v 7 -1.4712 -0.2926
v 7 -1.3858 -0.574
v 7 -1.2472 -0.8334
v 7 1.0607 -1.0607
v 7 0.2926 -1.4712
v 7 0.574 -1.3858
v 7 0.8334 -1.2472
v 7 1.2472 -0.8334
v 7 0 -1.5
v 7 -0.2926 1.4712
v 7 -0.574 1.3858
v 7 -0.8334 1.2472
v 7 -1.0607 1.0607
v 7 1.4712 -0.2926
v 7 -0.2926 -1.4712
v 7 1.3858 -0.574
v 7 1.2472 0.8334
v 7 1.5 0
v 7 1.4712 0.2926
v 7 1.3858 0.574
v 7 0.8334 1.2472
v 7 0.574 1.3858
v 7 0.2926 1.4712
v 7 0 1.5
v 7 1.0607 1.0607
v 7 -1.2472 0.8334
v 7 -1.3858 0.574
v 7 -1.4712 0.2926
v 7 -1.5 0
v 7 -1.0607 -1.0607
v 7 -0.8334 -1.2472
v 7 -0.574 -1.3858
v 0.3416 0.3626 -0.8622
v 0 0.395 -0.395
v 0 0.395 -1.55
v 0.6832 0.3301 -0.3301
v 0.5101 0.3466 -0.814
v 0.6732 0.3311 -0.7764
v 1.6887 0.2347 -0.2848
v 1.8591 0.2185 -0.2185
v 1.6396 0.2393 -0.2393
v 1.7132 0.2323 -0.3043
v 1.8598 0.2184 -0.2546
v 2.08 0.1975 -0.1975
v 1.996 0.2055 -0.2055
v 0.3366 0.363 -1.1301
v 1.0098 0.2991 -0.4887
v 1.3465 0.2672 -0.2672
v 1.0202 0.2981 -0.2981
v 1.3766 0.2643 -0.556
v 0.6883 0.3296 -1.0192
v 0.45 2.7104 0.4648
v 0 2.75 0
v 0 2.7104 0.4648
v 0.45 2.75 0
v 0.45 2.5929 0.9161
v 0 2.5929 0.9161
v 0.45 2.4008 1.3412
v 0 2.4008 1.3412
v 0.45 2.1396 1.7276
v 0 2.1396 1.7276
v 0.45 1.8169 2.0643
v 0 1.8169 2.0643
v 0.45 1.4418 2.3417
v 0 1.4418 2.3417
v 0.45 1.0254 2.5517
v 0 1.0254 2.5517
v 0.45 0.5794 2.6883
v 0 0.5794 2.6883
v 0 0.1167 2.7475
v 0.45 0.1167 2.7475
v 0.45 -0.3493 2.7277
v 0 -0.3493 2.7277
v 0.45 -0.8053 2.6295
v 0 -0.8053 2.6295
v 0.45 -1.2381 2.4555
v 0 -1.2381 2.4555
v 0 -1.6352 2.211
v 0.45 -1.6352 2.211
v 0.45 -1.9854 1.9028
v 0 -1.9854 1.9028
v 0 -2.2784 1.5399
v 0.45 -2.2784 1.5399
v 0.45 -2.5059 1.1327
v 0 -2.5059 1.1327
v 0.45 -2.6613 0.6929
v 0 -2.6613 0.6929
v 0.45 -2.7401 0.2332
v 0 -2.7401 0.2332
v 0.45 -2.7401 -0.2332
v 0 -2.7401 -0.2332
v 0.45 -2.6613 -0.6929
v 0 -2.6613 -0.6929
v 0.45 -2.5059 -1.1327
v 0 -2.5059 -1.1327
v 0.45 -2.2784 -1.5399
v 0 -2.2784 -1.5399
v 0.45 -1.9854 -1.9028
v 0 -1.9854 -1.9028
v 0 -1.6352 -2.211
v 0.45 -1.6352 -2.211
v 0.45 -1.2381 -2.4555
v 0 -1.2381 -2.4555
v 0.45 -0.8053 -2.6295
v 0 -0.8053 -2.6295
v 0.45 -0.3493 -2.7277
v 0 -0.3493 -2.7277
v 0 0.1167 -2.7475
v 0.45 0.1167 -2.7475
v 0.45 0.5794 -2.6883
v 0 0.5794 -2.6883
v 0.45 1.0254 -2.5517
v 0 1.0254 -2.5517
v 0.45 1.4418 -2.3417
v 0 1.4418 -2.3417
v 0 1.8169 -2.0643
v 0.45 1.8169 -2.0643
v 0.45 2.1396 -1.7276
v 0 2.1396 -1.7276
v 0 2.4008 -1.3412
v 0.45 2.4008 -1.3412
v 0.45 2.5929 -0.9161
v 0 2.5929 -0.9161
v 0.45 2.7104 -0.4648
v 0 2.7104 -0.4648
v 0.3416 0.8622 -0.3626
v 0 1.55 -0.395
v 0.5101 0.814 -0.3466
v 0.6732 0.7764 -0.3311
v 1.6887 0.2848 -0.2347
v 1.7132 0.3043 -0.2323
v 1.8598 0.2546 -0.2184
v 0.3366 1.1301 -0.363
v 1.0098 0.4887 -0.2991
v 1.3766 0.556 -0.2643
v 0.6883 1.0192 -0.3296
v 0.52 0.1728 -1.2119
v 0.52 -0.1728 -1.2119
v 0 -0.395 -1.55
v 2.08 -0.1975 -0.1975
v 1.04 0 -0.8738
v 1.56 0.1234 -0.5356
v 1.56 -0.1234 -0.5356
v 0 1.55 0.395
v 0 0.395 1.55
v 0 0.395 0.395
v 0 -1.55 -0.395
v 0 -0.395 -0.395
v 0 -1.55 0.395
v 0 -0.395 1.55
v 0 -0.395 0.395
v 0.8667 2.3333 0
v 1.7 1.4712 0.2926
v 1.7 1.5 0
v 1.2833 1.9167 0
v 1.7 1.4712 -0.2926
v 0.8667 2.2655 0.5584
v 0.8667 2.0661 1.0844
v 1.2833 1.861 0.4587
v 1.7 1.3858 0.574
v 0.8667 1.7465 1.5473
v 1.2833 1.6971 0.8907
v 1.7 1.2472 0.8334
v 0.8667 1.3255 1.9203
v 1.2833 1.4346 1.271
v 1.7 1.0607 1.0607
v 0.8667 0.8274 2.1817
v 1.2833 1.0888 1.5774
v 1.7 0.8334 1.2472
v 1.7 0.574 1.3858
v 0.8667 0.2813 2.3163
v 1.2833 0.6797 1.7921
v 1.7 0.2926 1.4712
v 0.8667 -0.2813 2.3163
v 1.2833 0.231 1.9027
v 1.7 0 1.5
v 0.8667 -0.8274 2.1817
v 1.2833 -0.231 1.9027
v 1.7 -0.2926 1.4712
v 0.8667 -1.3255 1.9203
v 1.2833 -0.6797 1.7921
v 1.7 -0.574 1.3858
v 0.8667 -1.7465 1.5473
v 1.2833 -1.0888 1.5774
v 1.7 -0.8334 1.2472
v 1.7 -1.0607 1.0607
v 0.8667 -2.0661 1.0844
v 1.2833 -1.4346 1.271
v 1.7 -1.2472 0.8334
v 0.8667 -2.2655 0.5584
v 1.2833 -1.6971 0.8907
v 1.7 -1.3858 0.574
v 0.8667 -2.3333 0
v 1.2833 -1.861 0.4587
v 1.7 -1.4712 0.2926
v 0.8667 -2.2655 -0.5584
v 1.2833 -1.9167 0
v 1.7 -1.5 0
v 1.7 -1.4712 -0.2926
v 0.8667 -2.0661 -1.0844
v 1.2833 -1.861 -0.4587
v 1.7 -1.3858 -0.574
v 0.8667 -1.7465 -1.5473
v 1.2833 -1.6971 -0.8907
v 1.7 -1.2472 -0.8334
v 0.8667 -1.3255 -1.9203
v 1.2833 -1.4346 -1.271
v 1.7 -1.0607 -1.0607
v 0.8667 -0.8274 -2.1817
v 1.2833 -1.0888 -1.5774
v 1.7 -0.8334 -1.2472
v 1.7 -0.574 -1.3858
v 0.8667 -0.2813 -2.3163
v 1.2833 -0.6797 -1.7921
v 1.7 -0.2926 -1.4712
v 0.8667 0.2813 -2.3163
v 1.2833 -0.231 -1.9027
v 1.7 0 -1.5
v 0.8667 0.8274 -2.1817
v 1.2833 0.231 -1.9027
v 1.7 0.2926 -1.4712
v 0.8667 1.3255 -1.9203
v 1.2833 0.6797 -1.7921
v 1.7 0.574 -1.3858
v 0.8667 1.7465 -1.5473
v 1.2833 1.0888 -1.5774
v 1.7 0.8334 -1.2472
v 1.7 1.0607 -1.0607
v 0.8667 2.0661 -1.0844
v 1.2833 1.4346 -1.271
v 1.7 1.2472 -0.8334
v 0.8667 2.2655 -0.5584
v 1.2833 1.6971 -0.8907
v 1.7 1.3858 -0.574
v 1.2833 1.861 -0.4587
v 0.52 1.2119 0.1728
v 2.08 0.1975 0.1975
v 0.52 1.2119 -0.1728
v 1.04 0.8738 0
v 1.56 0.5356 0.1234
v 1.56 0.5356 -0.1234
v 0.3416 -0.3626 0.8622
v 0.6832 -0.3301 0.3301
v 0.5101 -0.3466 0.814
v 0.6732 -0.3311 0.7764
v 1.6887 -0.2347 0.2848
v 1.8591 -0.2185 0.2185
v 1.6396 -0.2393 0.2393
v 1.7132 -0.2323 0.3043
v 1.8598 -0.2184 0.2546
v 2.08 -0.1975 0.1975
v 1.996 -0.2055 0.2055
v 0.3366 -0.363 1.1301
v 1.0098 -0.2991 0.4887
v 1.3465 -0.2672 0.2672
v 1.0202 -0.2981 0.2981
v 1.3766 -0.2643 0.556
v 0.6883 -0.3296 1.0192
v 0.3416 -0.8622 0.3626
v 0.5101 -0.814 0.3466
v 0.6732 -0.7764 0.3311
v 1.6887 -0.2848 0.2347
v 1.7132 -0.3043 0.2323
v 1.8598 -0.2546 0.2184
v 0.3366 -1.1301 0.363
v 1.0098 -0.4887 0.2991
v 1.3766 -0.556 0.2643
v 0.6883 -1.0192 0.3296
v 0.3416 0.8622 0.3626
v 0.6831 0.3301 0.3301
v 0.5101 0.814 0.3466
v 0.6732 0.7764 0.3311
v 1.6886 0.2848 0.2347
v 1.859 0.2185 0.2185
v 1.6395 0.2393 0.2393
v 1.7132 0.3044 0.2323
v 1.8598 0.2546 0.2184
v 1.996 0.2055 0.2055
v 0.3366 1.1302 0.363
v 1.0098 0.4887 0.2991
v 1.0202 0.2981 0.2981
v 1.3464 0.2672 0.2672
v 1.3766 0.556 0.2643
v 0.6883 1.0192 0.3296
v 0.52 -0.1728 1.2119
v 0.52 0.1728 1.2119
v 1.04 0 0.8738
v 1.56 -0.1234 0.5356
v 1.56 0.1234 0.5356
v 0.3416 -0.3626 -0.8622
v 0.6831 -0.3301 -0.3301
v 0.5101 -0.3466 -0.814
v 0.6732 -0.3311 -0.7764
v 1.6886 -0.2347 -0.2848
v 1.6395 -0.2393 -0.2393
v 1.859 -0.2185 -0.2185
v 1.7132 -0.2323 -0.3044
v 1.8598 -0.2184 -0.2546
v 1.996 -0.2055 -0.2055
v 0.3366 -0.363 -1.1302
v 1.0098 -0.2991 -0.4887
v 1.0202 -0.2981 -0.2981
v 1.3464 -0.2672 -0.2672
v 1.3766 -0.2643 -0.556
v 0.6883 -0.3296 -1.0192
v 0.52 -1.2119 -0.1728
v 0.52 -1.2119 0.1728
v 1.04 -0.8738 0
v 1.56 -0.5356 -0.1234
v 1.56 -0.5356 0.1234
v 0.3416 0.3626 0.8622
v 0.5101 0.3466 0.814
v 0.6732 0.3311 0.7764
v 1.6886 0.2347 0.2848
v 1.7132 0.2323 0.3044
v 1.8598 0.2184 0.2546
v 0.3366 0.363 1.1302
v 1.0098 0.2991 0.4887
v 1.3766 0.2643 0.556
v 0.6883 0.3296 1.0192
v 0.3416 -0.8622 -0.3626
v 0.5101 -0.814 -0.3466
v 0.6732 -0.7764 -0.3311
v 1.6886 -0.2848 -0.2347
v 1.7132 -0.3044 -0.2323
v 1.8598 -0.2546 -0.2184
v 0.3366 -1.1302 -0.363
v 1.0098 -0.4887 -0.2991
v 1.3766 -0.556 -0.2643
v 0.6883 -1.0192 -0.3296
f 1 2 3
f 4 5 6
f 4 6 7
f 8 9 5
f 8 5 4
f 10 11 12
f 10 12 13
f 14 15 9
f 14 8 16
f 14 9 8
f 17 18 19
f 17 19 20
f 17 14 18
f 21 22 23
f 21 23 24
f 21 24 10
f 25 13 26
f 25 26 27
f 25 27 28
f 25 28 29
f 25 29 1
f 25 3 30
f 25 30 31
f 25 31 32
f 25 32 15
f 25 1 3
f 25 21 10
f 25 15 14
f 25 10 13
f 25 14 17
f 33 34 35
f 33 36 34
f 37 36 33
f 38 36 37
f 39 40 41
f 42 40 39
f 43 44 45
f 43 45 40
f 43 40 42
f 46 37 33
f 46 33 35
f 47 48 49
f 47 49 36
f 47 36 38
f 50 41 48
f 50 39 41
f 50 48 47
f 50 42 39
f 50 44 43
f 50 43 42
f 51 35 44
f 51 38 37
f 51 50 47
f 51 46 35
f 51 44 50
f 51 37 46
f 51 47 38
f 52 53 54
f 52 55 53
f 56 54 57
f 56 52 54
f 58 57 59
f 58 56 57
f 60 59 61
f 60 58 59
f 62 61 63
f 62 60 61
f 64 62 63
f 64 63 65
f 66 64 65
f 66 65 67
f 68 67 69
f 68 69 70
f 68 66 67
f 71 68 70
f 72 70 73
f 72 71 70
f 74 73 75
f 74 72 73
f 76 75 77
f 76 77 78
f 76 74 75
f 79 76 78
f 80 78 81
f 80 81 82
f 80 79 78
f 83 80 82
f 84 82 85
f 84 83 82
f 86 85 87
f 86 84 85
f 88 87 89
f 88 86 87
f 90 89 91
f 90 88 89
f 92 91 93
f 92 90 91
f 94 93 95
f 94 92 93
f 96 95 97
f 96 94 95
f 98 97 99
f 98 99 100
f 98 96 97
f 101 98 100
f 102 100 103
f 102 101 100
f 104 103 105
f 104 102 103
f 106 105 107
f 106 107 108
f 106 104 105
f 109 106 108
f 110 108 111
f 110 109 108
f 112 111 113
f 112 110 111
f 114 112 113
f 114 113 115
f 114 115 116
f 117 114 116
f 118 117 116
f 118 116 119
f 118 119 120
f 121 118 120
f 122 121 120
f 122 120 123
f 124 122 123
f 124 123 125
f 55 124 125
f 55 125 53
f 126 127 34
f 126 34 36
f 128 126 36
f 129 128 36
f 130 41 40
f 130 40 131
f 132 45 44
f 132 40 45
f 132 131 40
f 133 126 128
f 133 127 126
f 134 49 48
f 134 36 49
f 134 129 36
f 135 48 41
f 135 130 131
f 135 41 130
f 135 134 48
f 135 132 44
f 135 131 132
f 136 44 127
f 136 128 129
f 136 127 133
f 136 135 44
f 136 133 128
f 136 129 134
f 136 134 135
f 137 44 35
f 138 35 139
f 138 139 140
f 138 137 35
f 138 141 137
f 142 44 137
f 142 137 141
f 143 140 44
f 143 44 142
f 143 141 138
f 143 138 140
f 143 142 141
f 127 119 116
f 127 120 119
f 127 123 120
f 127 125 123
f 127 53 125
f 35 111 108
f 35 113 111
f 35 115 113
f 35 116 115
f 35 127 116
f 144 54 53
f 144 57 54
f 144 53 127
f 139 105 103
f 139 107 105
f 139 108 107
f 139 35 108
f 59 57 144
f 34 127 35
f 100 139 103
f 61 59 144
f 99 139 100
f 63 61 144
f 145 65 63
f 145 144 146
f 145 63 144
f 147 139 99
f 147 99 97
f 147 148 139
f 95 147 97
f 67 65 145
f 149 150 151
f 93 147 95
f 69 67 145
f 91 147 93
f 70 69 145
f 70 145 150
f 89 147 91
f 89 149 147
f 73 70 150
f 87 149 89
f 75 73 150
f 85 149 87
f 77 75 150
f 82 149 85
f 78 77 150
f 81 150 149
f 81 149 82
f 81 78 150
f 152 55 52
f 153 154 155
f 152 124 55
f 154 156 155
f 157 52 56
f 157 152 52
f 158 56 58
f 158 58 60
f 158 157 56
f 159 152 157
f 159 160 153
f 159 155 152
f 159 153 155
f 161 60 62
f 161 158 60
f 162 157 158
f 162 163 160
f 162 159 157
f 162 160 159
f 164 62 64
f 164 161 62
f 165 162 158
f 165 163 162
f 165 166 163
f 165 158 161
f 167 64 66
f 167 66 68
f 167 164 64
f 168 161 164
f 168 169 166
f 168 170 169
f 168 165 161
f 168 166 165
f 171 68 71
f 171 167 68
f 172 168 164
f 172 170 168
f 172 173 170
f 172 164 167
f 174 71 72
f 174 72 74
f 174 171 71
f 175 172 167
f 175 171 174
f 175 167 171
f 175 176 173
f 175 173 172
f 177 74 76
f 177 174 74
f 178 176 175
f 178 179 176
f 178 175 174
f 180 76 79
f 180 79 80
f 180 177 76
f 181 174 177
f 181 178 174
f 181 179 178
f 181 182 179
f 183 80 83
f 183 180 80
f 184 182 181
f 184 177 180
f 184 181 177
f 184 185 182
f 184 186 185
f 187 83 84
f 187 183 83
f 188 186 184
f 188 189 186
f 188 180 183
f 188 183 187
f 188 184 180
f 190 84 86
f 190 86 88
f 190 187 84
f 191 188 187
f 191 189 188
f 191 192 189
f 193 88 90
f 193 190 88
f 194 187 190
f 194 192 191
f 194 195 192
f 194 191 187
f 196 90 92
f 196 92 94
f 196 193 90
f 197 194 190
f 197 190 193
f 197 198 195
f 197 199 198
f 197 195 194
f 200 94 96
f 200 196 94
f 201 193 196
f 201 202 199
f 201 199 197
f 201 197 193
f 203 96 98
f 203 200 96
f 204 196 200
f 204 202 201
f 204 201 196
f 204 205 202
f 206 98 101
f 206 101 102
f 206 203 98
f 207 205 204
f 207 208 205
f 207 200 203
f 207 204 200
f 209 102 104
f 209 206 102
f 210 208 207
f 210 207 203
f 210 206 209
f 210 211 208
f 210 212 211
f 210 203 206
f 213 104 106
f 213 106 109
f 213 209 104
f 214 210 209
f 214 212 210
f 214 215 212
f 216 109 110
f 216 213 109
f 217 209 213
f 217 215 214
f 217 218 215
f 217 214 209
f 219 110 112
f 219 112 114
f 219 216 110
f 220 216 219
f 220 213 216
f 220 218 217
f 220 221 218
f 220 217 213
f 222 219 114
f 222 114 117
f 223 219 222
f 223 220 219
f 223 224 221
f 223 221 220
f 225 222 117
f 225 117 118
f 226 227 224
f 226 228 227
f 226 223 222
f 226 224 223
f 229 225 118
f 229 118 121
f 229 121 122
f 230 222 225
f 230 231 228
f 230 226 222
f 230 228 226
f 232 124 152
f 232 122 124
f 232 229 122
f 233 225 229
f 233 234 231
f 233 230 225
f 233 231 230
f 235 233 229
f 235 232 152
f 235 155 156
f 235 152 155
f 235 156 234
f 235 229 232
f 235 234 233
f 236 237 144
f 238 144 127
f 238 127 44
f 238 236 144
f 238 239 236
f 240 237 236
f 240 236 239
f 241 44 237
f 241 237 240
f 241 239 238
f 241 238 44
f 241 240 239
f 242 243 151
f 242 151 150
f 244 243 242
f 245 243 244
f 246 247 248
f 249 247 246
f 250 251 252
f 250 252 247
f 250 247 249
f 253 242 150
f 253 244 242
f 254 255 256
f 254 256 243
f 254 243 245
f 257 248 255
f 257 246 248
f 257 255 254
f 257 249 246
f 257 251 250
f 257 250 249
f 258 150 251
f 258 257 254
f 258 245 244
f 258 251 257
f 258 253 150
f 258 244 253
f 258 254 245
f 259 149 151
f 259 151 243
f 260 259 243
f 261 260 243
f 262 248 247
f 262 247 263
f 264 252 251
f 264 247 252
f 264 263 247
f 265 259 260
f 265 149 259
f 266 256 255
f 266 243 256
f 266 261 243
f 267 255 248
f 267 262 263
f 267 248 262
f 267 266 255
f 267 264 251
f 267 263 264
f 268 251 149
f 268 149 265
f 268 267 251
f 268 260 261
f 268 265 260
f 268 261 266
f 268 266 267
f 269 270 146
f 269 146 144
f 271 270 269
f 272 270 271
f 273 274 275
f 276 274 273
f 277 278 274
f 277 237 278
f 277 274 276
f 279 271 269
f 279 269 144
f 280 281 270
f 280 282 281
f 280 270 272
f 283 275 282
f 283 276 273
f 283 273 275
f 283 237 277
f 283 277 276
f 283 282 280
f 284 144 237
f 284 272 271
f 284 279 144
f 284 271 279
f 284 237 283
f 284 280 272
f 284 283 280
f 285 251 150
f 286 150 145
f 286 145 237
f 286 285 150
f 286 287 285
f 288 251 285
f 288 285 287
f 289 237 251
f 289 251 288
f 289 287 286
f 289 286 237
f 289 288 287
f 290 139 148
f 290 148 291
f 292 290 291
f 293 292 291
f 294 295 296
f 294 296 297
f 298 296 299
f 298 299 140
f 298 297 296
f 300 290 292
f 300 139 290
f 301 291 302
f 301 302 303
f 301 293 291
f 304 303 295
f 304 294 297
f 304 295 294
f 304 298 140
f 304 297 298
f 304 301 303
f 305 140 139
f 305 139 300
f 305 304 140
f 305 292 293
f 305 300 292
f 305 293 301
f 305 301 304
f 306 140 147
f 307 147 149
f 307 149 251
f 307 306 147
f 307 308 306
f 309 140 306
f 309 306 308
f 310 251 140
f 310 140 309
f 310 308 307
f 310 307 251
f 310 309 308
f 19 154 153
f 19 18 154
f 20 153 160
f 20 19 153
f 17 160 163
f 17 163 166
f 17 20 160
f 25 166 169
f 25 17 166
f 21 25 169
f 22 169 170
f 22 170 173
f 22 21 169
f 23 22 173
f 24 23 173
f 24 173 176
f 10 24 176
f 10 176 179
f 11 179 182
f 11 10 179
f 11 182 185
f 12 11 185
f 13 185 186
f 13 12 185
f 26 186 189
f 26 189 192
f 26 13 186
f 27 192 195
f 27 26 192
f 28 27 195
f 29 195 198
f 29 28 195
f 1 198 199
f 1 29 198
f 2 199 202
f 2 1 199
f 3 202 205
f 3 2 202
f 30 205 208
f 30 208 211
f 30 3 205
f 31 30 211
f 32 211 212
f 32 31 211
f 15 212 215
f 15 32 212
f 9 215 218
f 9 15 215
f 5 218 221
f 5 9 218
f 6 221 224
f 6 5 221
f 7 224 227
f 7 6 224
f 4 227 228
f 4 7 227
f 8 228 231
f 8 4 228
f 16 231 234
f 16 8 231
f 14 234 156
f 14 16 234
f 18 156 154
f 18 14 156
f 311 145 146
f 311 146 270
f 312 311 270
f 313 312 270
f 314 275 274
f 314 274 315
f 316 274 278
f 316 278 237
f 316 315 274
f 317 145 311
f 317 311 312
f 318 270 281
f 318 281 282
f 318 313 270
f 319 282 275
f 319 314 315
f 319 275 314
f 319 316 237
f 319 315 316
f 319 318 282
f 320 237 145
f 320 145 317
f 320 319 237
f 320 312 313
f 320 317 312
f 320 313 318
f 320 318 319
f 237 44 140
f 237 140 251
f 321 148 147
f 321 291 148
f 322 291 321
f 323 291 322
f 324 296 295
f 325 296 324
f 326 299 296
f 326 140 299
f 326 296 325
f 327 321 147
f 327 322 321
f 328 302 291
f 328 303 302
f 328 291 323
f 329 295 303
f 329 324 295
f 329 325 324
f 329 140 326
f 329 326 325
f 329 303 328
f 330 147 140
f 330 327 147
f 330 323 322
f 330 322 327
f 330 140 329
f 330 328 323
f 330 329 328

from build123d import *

# Parameters (mm, degrees)
SKETCH3_W         = 0.79
SKETCH3_H         = 3.1
SKETCH4_W         = 0.395
SKETCH4_H         = 0.395
CIRPATTERN1_COUNT = 2
CIRPATTERN1_ANGLE = 90


with BuildPart() as part:
    # BodySke → Base-Revolve (revolve)
    with BuildSketch(Plane.XY):
        Polygon((0, 0), (0, 2.75), (0.45, 2.75), (1.7, 1.5), (7, 1.5), (7, 0), align=None)
    revolve(axis=Axis((-6.35, 0, 0), (1, 0, 0)))

    # Sketch3 → Cross section 0
    with BuildSketch(Plane.ZY):
        Rectangle(SKETCH3_W, SKETCH3_H)
    # Sketch4 → Cross section 1
    with BuildSketch(Plane.ZY.offset(-2.08)):
        Rectangle(SKETCH4_W, SKETCH4_H)
    cross = loft(mode=Mode.SUBTRACT)

    # CirPattern1: Cross ×2 about axis
    cirpattern1_axis = Axis((0, 0, 0), (1, 0, 0))
    for i in range(1, CIRPATTERN1_COUNT):
        add(cross.rotate(cirpattern1_axis, i * CIRPATTERN1_ANGLE / (CIRPATTERN1_COUNT - 1)), mode=Mode.SUBTRACT)


solid = part.part
